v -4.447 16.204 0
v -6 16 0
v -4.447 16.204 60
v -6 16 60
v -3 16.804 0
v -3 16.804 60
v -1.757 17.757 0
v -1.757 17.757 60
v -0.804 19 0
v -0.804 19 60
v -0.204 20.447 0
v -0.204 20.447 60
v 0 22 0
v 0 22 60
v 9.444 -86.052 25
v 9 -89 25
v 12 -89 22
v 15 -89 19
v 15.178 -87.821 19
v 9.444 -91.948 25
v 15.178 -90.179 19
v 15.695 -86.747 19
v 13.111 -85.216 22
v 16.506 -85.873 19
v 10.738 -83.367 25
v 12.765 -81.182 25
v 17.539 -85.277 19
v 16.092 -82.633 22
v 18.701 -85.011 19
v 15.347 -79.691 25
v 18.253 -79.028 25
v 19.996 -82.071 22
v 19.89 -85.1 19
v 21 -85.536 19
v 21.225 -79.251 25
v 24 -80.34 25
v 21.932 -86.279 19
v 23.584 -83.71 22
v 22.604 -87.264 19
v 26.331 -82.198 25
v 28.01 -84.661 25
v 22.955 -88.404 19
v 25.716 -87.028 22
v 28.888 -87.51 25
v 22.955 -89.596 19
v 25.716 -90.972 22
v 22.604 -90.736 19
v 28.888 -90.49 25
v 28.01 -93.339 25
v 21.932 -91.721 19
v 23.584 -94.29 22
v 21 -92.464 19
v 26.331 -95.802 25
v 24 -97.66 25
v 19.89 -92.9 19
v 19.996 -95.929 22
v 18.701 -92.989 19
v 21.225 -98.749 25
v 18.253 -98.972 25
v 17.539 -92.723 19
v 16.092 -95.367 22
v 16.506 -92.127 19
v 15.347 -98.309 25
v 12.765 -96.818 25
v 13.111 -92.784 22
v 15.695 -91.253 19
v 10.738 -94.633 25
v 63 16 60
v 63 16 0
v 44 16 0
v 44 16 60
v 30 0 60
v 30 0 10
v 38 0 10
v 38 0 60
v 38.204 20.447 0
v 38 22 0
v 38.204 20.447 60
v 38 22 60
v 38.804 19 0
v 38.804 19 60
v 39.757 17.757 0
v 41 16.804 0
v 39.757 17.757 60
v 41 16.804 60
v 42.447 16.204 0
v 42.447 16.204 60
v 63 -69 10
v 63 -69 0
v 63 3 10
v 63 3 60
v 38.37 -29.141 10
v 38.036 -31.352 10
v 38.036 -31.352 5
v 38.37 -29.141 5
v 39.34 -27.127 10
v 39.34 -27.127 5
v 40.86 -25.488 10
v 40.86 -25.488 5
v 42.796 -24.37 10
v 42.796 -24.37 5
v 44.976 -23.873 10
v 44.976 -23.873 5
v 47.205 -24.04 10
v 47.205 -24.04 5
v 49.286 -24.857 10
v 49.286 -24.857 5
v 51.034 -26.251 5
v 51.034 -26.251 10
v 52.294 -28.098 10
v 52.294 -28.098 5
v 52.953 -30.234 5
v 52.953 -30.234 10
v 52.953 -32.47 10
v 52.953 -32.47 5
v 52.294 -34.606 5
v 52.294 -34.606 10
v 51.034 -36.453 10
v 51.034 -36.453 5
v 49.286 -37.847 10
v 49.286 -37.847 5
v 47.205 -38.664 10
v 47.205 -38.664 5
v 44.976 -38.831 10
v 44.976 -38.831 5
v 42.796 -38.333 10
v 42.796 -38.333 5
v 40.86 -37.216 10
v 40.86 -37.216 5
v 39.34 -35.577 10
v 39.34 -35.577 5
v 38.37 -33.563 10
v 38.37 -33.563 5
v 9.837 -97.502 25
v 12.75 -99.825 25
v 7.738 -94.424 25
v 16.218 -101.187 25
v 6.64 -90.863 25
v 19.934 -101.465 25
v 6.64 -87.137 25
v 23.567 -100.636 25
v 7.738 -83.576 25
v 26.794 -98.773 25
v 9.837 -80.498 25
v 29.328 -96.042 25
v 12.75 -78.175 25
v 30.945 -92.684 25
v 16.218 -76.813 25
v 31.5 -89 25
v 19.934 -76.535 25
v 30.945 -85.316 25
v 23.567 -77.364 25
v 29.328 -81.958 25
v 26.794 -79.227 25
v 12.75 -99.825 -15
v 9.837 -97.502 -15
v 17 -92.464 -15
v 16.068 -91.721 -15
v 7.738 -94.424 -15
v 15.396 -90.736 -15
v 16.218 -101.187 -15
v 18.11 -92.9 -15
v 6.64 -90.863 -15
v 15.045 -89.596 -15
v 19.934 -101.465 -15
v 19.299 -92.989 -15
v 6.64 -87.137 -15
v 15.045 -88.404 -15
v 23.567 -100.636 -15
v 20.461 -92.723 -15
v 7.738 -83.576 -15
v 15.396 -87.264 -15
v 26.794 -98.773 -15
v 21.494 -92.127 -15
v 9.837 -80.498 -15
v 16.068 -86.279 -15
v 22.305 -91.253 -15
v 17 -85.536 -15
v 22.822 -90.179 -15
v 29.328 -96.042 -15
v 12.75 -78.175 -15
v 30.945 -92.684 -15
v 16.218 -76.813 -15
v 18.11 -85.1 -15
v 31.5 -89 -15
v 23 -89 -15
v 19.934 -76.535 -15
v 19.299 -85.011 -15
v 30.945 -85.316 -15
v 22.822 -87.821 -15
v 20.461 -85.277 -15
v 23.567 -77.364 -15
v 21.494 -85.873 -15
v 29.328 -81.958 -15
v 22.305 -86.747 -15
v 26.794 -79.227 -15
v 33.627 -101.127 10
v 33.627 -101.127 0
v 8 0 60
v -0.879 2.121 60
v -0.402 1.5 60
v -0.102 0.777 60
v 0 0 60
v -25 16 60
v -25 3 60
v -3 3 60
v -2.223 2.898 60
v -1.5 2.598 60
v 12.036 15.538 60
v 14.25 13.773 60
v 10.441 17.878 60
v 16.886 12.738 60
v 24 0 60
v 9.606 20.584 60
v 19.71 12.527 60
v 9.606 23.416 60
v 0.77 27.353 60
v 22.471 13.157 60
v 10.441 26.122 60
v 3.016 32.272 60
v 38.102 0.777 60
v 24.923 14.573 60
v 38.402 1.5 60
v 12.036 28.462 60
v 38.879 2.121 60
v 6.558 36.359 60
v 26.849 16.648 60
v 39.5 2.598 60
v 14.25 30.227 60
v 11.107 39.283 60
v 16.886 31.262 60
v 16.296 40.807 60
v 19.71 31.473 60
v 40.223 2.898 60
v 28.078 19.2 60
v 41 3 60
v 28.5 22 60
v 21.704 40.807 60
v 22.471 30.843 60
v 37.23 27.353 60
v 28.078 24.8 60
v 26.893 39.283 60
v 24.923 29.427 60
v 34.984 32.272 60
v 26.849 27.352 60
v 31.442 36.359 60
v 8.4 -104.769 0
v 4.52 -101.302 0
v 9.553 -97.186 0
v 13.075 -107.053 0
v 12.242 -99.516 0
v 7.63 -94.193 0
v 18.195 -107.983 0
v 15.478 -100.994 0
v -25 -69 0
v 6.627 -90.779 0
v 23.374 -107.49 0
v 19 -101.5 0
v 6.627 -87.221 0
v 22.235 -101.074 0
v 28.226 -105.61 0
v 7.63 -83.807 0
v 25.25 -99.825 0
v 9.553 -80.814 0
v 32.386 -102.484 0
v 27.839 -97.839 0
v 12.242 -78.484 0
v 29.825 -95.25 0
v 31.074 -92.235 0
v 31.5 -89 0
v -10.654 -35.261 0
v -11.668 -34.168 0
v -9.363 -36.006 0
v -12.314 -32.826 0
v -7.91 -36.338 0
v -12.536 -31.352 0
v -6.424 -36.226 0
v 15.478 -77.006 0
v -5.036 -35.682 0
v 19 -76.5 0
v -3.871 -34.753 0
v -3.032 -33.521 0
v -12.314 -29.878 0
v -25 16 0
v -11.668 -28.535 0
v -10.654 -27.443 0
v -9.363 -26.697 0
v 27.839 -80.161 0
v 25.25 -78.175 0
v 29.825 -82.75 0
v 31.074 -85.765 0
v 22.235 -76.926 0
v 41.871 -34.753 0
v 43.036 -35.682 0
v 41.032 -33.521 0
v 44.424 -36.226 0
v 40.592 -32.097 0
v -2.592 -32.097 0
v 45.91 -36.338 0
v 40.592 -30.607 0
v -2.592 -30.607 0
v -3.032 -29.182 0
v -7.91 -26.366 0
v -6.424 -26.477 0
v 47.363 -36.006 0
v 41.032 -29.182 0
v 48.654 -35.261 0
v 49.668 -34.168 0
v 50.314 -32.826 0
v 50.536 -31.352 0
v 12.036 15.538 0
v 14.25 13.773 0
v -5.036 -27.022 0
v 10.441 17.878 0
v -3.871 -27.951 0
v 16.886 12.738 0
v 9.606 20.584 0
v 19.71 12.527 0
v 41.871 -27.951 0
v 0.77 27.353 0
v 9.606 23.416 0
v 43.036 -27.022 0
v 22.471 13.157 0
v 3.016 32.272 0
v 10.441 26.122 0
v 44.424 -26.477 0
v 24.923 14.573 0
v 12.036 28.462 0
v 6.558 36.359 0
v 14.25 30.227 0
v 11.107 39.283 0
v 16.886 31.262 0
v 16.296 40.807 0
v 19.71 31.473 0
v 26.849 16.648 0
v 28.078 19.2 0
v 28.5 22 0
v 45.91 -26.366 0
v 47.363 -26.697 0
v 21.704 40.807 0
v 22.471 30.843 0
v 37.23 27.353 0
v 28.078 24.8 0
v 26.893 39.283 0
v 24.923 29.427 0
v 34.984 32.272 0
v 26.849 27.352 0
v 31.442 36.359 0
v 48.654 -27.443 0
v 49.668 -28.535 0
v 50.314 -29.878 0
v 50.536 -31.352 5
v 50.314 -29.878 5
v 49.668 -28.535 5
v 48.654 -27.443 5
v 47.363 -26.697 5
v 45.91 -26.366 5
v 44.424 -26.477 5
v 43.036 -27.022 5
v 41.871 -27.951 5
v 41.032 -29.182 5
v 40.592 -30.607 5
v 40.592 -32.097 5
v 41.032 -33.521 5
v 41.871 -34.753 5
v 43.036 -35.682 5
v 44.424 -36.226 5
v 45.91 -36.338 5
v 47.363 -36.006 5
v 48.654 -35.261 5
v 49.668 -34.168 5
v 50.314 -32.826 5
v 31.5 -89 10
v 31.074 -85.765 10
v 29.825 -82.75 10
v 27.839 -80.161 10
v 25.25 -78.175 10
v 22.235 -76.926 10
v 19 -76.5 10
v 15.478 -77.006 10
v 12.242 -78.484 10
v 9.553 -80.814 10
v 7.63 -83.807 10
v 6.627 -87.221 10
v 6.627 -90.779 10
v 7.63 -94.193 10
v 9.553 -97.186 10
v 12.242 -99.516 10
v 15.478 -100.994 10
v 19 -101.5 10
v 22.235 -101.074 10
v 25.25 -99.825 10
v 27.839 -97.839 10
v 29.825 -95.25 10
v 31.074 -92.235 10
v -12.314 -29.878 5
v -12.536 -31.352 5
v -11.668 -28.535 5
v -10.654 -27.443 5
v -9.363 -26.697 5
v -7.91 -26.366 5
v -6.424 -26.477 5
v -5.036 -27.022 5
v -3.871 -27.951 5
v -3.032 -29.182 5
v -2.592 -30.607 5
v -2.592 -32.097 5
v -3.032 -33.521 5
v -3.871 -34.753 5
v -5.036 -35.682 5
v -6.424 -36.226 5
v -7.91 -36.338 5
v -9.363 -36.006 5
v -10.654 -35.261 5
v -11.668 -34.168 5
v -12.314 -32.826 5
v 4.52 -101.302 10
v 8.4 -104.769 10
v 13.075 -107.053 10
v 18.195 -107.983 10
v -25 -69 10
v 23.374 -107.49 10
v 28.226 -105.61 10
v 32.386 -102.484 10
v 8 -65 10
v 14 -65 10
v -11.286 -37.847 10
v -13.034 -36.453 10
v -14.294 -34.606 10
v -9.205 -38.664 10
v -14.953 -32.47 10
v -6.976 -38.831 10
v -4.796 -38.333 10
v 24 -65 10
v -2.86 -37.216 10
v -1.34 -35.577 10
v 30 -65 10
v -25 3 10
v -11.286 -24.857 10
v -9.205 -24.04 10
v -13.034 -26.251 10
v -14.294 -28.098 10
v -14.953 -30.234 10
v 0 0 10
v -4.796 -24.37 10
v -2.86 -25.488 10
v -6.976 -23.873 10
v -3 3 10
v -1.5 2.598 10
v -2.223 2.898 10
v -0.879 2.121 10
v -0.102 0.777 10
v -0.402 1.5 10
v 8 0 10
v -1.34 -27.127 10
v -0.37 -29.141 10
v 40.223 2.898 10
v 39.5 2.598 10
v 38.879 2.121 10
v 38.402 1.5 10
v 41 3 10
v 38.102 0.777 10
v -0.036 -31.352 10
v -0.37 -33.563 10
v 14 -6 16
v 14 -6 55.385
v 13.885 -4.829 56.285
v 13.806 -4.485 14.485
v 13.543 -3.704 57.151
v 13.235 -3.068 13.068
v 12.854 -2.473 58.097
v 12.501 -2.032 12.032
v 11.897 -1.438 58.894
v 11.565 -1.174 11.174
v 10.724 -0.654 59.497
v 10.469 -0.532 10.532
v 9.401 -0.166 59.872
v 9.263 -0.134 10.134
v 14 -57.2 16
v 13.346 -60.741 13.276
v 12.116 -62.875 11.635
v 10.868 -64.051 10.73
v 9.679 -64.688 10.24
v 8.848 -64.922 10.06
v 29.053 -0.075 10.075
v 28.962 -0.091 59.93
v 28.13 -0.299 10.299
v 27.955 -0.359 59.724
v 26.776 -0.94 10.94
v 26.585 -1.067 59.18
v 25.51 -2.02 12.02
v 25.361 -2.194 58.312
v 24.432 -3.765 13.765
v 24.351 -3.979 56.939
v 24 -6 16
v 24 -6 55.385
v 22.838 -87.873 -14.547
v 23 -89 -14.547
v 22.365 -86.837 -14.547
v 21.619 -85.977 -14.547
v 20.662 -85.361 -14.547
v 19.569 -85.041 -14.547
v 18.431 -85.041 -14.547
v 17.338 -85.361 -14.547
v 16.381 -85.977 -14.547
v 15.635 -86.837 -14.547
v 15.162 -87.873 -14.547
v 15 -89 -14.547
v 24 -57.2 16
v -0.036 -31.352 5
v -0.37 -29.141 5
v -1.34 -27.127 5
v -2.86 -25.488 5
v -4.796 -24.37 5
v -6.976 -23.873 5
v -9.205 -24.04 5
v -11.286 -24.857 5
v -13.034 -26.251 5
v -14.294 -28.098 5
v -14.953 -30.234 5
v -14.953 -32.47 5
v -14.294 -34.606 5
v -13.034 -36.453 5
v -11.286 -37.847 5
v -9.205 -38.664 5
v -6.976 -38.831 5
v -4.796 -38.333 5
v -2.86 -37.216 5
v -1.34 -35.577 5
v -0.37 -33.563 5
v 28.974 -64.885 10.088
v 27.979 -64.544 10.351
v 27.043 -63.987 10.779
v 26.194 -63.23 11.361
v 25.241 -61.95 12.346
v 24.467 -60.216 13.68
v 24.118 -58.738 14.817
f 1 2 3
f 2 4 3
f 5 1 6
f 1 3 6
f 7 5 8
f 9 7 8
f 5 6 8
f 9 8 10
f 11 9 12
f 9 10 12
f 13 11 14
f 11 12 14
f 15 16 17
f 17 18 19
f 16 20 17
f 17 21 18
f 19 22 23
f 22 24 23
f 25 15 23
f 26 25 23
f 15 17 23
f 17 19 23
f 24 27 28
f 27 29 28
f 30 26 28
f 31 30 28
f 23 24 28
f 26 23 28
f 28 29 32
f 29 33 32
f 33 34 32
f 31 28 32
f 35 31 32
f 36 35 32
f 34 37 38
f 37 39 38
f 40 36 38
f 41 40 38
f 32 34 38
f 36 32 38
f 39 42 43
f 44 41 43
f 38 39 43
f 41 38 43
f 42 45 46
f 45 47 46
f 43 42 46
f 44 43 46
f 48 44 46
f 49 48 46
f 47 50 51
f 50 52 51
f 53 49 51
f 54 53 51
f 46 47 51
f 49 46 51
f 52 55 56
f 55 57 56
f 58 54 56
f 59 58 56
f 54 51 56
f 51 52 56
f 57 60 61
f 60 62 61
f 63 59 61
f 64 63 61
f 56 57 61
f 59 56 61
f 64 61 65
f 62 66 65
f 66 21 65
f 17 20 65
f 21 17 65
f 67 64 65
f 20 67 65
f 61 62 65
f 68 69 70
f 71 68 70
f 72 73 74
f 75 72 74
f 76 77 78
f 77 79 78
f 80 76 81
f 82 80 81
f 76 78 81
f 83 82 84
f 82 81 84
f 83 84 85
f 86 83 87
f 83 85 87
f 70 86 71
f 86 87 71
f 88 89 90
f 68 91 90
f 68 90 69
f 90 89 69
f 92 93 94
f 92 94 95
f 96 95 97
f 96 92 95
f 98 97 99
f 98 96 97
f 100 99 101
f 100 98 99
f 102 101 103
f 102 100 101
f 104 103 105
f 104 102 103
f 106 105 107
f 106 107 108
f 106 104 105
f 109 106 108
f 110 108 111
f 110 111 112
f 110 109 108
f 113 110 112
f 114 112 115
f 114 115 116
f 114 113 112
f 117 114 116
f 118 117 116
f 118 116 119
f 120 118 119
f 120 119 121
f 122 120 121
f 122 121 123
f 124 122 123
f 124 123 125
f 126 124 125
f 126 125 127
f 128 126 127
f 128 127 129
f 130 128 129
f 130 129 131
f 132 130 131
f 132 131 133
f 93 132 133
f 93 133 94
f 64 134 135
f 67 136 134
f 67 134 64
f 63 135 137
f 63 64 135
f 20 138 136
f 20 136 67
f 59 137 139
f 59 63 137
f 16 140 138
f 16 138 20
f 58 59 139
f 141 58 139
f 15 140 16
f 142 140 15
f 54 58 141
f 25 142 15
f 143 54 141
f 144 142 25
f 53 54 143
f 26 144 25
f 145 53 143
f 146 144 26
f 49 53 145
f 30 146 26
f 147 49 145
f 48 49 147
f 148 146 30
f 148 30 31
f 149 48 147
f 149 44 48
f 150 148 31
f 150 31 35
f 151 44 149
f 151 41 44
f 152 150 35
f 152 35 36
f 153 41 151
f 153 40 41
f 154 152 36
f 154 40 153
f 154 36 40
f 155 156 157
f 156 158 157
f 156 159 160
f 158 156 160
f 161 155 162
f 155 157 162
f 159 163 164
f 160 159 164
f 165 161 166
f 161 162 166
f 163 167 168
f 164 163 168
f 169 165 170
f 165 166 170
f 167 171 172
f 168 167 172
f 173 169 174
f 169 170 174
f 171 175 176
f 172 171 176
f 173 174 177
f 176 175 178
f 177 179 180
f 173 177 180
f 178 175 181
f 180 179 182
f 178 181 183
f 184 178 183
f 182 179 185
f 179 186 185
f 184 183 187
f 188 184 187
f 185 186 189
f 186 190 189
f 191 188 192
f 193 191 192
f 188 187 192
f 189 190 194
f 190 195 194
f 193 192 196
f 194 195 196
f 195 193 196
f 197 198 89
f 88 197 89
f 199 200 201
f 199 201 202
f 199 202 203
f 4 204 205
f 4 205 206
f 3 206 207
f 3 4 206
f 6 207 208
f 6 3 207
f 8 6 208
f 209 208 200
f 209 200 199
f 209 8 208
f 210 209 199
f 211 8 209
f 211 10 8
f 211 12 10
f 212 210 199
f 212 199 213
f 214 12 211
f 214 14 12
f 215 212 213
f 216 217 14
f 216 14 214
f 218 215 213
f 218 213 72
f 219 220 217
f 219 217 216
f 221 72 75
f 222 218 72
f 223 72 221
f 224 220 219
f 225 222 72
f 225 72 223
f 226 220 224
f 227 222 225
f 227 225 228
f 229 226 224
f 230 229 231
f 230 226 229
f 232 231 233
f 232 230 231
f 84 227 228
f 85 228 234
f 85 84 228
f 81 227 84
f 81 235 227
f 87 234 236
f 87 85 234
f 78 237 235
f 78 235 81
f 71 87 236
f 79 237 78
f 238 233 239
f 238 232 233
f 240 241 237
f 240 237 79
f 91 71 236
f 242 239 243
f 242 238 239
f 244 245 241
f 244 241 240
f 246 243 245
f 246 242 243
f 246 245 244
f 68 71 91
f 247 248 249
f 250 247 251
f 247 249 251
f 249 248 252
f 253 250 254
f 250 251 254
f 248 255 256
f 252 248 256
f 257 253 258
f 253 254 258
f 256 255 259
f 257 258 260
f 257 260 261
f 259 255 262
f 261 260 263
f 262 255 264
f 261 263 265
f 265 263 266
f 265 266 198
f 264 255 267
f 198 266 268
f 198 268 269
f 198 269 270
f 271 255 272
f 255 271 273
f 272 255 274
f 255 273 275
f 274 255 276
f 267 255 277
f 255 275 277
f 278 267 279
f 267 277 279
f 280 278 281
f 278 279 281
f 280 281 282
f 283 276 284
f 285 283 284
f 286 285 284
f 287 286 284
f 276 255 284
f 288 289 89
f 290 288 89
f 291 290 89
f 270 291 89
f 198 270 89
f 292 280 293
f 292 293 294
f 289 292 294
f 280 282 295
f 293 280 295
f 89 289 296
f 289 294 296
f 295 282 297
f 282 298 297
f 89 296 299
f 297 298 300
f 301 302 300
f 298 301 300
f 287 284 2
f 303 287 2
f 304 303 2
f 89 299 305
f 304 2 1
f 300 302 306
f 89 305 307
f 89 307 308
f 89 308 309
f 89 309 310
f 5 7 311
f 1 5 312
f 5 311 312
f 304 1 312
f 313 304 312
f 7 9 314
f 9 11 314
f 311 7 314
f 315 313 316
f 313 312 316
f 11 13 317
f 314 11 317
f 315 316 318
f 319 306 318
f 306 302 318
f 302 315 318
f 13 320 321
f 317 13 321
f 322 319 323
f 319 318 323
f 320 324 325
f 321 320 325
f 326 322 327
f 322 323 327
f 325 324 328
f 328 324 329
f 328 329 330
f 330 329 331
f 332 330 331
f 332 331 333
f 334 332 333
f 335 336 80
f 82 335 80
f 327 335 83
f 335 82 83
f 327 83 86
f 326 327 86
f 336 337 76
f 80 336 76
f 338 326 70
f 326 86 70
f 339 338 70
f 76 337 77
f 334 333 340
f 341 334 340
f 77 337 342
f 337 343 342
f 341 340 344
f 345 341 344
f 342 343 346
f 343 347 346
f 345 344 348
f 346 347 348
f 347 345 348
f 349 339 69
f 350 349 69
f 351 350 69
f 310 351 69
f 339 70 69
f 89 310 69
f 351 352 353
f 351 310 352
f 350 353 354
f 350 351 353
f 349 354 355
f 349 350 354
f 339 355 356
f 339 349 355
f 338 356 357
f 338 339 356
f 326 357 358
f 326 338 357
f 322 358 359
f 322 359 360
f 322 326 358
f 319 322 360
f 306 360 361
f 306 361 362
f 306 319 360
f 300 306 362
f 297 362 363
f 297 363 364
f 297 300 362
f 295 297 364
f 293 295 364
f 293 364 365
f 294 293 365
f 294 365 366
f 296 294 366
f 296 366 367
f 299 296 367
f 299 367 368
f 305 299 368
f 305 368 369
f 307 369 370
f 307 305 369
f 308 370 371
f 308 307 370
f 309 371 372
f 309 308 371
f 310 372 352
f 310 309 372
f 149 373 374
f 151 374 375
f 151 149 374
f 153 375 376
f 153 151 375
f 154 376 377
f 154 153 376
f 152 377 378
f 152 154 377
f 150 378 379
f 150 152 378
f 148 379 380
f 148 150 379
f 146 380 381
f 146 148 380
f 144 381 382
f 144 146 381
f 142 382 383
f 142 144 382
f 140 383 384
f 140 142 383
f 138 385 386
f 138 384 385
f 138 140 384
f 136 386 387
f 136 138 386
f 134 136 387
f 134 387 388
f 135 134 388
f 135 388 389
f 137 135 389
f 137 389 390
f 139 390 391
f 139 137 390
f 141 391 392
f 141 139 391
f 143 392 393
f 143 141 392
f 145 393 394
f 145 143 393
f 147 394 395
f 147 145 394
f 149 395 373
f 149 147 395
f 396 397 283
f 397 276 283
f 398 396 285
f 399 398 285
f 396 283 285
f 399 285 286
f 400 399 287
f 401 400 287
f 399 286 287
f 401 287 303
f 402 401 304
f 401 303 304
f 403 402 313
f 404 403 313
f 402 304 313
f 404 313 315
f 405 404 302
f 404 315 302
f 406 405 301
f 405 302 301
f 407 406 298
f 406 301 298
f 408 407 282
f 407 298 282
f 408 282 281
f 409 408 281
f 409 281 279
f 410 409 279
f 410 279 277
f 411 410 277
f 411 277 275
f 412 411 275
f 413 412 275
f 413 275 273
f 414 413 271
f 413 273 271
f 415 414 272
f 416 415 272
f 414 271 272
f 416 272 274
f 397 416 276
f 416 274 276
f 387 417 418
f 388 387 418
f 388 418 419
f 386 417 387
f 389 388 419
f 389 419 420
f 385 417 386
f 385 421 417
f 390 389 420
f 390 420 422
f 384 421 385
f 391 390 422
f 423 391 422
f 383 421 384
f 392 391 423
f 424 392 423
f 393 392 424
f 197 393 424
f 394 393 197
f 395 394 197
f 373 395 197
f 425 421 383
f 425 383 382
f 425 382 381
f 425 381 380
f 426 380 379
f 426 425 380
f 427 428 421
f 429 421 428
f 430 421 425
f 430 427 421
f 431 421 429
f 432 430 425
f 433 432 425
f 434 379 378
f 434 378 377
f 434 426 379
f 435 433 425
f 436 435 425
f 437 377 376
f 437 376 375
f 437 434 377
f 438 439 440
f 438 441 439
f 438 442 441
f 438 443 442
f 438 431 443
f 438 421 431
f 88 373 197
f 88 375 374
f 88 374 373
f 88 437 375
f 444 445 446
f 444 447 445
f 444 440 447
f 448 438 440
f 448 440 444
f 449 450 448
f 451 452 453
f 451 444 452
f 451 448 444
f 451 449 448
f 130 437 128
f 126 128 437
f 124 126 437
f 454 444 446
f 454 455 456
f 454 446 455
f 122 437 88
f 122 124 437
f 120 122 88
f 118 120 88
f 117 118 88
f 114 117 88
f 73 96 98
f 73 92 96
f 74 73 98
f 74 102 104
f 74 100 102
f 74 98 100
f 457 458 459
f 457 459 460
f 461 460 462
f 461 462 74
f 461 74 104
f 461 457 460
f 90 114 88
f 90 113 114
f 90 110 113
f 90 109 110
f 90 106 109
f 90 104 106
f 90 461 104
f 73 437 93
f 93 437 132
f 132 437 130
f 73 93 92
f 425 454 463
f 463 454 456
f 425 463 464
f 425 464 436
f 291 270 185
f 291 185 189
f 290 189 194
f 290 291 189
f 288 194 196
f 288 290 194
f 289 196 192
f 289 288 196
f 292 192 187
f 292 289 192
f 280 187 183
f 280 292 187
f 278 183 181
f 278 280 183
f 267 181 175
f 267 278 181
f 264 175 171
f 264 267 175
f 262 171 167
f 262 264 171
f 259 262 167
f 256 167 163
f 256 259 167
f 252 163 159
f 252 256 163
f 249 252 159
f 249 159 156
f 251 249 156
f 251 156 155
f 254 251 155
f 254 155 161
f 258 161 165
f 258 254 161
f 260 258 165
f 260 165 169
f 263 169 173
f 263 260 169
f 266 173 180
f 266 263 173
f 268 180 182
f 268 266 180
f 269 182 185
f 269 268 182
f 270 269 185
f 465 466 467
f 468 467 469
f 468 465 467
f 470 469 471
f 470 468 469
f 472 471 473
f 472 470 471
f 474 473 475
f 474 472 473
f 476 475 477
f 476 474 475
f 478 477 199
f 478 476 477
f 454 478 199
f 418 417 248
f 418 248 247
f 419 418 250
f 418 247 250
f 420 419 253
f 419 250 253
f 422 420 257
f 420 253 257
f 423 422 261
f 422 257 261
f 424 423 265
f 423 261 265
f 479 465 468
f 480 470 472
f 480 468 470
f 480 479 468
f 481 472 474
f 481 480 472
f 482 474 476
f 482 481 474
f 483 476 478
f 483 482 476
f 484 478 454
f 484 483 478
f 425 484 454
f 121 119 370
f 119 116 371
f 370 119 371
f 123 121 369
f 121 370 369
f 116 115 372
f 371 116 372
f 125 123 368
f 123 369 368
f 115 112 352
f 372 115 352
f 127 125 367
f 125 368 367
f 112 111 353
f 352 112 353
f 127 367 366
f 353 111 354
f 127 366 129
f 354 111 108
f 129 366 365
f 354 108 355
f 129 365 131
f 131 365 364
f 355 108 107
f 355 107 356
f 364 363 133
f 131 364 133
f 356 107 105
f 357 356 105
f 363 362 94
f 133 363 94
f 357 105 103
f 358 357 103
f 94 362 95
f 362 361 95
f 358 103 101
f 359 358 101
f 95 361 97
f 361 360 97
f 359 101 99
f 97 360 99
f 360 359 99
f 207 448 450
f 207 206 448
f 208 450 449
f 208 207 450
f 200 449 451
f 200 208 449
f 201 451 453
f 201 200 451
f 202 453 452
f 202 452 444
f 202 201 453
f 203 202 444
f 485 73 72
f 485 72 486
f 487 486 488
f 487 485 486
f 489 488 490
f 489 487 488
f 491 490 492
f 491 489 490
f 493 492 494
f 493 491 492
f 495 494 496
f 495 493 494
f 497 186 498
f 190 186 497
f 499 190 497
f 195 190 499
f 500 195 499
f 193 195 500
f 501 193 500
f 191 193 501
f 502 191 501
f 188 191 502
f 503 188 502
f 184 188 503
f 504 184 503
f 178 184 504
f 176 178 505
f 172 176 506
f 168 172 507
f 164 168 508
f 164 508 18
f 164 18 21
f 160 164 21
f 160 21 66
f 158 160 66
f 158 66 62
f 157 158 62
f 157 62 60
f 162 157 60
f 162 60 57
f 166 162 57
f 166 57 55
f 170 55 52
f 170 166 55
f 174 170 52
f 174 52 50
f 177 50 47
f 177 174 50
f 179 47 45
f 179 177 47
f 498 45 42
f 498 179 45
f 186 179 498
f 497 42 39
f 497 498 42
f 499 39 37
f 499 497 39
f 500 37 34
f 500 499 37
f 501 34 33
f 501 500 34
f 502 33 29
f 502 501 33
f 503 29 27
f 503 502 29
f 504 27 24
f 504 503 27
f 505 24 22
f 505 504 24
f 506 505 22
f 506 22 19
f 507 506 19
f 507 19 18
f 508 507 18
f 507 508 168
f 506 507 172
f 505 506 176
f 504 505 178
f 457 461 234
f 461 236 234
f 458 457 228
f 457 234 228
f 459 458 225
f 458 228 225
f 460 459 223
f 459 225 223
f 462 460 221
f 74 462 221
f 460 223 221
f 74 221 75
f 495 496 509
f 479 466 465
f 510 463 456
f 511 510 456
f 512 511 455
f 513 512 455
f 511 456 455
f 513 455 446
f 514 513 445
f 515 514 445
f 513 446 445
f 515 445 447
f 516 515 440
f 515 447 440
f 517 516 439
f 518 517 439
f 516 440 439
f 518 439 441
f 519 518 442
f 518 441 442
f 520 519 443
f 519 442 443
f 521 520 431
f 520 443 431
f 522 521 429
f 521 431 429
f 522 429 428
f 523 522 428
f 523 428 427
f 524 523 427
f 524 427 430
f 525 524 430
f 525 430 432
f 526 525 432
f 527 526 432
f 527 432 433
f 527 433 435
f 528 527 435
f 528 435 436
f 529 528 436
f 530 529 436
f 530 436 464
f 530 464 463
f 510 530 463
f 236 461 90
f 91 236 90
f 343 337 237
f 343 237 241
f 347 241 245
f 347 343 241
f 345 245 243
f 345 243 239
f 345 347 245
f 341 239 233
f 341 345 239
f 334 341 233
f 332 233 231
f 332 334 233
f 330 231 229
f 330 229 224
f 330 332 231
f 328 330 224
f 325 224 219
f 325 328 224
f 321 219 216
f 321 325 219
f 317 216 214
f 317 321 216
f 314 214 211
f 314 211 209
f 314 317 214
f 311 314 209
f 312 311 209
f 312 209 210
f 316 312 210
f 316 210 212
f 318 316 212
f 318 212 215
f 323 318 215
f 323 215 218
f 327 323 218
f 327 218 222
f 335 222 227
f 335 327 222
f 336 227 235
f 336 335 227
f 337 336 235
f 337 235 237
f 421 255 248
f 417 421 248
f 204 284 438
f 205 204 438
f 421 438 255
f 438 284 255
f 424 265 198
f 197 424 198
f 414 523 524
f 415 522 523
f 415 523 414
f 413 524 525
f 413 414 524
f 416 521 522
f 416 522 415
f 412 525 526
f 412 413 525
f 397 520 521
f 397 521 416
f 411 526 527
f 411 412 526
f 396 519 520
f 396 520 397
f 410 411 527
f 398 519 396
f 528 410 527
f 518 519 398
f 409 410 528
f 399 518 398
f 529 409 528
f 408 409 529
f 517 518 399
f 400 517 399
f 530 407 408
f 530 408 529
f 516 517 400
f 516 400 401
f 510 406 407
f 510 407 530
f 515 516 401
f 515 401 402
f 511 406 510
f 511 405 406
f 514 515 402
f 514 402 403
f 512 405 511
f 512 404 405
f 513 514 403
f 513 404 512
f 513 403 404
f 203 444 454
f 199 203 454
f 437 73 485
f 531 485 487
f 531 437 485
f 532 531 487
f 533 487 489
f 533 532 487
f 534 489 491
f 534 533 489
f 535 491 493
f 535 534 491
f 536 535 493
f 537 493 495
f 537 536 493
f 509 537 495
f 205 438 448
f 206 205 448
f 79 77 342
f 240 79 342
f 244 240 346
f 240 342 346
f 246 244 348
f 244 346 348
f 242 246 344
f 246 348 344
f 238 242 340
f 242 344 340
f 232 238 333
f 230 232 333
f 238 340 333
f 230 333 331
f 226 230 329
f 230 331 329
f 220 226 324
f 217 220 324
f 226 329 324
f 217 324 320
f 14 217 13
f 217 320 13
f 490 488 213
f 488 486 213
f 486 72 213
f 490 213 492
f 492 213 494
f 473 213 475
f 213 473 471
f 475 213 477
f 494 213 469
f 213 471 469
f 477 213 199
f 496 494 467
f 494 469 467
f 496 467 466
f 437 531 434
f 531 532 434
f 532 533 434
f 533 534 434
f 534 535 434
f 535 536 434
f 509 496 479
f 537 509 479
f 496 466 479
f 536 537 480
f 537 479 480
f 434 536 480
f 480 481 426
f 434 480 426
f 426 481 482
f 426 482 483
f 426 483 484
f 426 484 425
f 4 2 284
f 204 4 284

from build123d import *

# Parameters (mm, degrees)
SKETCH1_R           = 9.5
BOSS_EXTRUDE1_DEPTH = 60
BOSS_EXTRUDE2_DEPTH = 10
FILLET1_R           = 6
FILLET2_R           = 6
FILLET3_R           = 3
BOSS_EXTRUDE4_DEPTH = 5
FILLET4_R           = 6
FILLET5_R           = 6
SKETCH6_R           = 12.5
BOSS_EXTRUDE5_DEPTH = 20
HOLE2_D             = 8
HOLE2_DEPTH         = 39.547439867
HOLE2_CSINK_D       = 20
HOLE2_CSINK_ANGLE   = 90
CUT_EXTRUDE1_START  = -40
SKETCH13_R          = 4
CUT_EXTRUDE1_DEPTH  = 40
HOLE4_D             = 10
HOLE4_CBORE_D       = 15
HOLE4_CBORE_DEPTH   = 5


# Some blends are built 0.0001 mm under size
with BuildPart() as part:
    # Sketch1 → Boss-Extrude1 (new body)
    with BuildSketch(Plane.XY):
        with BuildLine():
            Line((0, 0), (38, 0))
            Line((38, 0), (38, 3))
            Line((38, 3), (63, 3))
            Line((63, 3), (63, 16))
            Line((63, 16), (38, 16))
            Line((38, 16), (38, 22))
            ThreePointArc((38, 22), (19, 41), (0, 22))
            Line((0, 22), (0, 16))
            Line((0, 16), (-25, 16))
            Line((-25, 16), (-25, 3))
            Line((-25, 3), (0, 3))
            Line((0, 3), (0, 0))
        make_face()
        with Locations((19, 22)):
            Circle(SKETCH1_R, mode=Mode.SUBTRACT)
    extrude(amount=BOSS_EXTRUDE1_DEPTH)

    # Sketch2 → Boss-Extrude2 (add)
    with BuildSketch(Plane.XY):
        with BuildLine():
            Line((63, -69), (63, 3))
            Line((63, 3), (38, 3))
            Line((38, 3), (38, 0))
            Line((38, 0), (19, 0))
            Line((19, 0), (0, 0))
            Line((0, 0), (0, 3))
            Line((0, 3), (-25, 3))
            Line((-25, 3), (-25, -69))
            Line((-25, -69), (4.520418495, -101.302102237))
            ThreePointArc((4.520418495, -101.302102237), (18.194672039, -107.98292514), (32.385626244, -102.484250445))
            Line((32.385626244, -102.484250445), (33.626524101, -101.127027365))
            Line((33.626524101, -101.127027365), (63, -69))
        make_face()
        with BuildLine():
            ThreePointArc((19, -101.5), (6.5, -89), (19, -76.5))
            ThreePointArc((19, -76.5), (27.838834765, -80.161165235), (31.5, -89))
            ThreePointArc((31.5, -89), (27.838834765, -97.838834765), (19, -101.5))
        make_face(mode=Mode.SUBTRACT)
    extrude(amount=BOSS_EXTRUDE2_DEPTH)

    # Fillet1
    fillet1_edges = [part.edges().sort_by_distance(p)[0] for p in [
        (0, 16, 30),
    ]]
    fillet(fillet1_edges, radius=FILLET1_R - 0.0001)  # a hair under: the kernel refuses the full size

    # Fillet2
    fillet2_edges = [part.edges().sort_by_distance(p)[0] for p in [
        (38, 16, 30),
    ]]
    fillet(fillet2_edges, radius=FILLET2_R - 0.0001)  # a hair under: the kernel refuses the full size

    # Fillet3
    fillet3_edges = [part.edges().sort_by_distance(p)[0] for p in [
        (0, 3, 35),
        (38, 3, 35),
    ]]
    fillet(fillet3_edges, radius=FILLET3_R - 0.0001)  # a hair under: the kernel refuses the full size

    # Sketch4 → Boss-Extrude4 (add, symmetric)
    with BuildSketch(Plane(origin=(19, 0, 0), x_dir=(0, 0, -1), z_dir=(1, 0, 0))):
        Polygon((-60, 0), (-10, -65), (-10, 0), align=None)
    extrude(amount=BOSS_EXTRUDE4_DEPTH, both=True)

    # Fillet4
    # the kernel refuses this fillet: 6 mm, written as the material it adds along each edge
    with BuildSketch(Plane(origin=(14, 0, -5), x_dir=(-1, 0, 0), z_dir=(0, 0, 1))) as fillet4_piece_1_section:
        with BuildLine():
            CenterArc((FILLET4_R, FILLET4_R), FILLET4_R, 180, 90)
            Line((0, FILLET4_R), (0, 0))
            Line((0, 0), (FILLET4_R, 0))
        make_face()
    fillet4_piece_1 = extrude(amount=80, mode=Mode.PRIVATE)
    fillet4_piece_1 = split(fillet4_piece_1, bisect_by=Plane(origin=(12.648095827, -13.156695973, 49.879464636), z_dir=(0, 0.6097107608496924, -0.7926239891046001)), keep=Keep.TOP, mode=Mode.PRIVATE)
    fillet4_piece_1 = split(fillet4_piece_1, bisect_by=Plane(origin=(12.648095827, -1.320325191, 0), z_dir=(0, 0, 1)), keep=Keep.TOP, mode=Mode.PRIVATE)
    add(fillet4_piece_1)
    with BuildSketch(Plane(origin=(24, 0, -5), x_dir=(1, 0, 0), z_dir=(0, 0, 1))) as fillet4_piece_2_section:
        with BuildLine():
            CenterArc((FILLET4_R, -FILLET4_R), FILLET4_R, 90, 90)
            Line((0, -FILLET4_R), (0, 0))
            Line((0, 0), (FILLET4_R, 0))
        make_face()
    fillet4_piece_2 = extrude(amount=80, mode=Mode.PRIVATE)
    fillet4_piece_2 = split(fillet4_piece_2, bisect_by=Plane(origin=(25.351904173, -13.156695973, 49.879464636), z_dir=(0, 0.6097107608496924, -0.7926239891046001)), keep=Keep.TOP, mode=Mode.PRIVATE)
    fillet4_piece_2 = split(fillet4_piece_2, bisect_by=Plane(origin=(25.351904173, -1.320325191, 0), z_dir=(0, 0, 1)), keep=Keep.TOP, mode=Mode.PRIVATE)
    add(fillet4_piece_2)

    # Fillet5
    # the kernel refuses this fillet: 6 mm, written as the material it adds along each edge
    with BuildSketch(Plane(origin=(24, -80, 10), x_dir=(1, 0, 0), z_dir=(0, 1, 0))) as fillet5_piece_1_section:
        with BuildLine():
            CenterArc((FILLET5_R, -FILLET5_R), FILLET5_R, 90, 90)
            Line((0, -FILLET5_R), (0, 0))
            Line((0, 0), (FILLET5_R, 0))
        make_face()
    fillet5_piece_1 = extrude(amount=89, mode=Mode.PRIVATE)
    fillet5_piece_1 = split(fillet5_piece_1, bisect_by=Plane(origin=(25.330544352, -46.320917546, 24.368524964), z_dir=(0, 0.6097107608496924, -0.7926239891046002)), keep=Keep.TOP, mode=Mode.PRIVATE)
    add(fillet5_piece_1)
    with BuildSketch(Plane(origin=(14, -80, 10), x_dir=(-1, 0, 0), z_dir=(0, 1, 0))) as fillet5_piece_2_section:
        with BuildLine():
            CenterArc((FILLET5_R, FILLET5_R), FILLET5_R, 180, 90)
            Line((0, FILLET5_R), (0, 0))
            Line((0, 0), (FILLET5_R, 0))
        make_face()
    fillet5_piece_2 = extrude(amount=89, mode=Mode.PRIVATE)
    fillet5_piece_2 = split(fillet5_piece_2, bisect_by=Plane(origin=(12.669455648, -46.320917546, 24.368524964), z_dir=(0, 0.6097107608496924, -0.7926239891046002)), keep=Keep.TOP, mode=Mode.PRIVATE)
    add(fillet5_piece_2)

    # Sketch6 → Boss-Extrude5 (add, symmetric)
    with BuildSketch(Plane.XY.offset(5)):
        with Locations((19, -89)):
            Circle(SKETCH6_R)
    extrude(amount=BOSS_EXTRUDE5_DEPTH, both=True)

    # Hole2
    with Locations(Plane.XY.offset(25)):
        with Locations((19, -89)):
            CounterSinkHole(HOLE2_D / 2, HOLE2_CSINK_D / 2, depth=HOLE2_DEPTH, counter_sink_angle=HOLE2_CSINK_ANGLE)

    # Sketch13 → Cut-Extrude1 (cut)
    with BuildSketch(Plane.XY.offset(-14.547439867).offset(CUT_EXTRUDE1_START)):
        with Locations((19, -89)):
            Circle(SKETCH13_R)
    extrude(amount=CUT_EXTRUDE1_DEPTH, mode=Mode.SUBTRACT)

    # Hole4 (through all)
    with Locations(Plane(origin=(-7.536351987, -31.351857419, 10), x_dir=(1, 0, 0), z_dir=(0, 0, 1))):
        with Locations((0, 0)):
            hole4 = CounterBoreHole(HOLE4_D / 2, HOLE4_CBORE_D / 2, HOLE4_CBORE_DEPTH)

    # Mirror2: Hole4 across plane
    add(hole4.mirror(Plane(origin=(19, 0, 0), x_dir=(0, 0, 1), z_dir=(1, 0, 0))), mode=Mode.SUBTRACT)


solid = part.part
